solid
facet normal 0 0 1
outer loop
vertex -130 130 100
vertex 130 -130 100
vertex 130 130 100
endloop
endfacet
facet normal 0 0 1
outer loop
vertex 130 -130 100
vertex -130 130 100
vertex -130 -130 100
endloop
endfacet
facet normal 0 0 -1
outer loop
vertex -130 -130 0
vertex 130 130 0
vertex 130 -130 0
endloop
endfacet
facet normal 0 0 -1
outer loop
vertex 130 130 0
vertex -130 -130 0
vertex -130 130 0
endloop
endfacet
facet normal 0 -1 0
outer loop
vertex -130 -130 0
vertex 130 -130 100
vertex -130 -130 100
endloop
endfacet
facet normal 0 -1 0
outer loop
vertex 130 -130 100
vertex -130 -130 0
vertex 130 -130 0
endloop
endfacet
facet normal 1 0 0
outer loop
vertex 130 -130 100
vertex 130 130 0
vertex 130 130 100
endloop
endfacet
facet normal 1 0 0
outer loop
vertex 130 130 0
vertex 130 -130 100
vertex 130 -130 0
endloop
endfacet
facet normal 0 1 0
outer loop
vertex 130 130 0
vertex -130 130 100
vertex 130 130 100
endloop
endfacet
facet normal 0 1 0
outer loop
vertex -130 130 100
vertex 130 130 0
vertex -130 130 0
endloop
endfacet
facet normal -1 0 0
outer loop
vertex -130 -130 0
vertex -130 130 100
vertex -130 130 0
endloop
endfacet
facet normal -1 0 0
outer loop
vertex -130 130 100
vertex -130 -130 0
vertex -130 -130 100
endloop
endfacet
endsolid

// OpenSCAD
// Generated documentary F1 envelope proxy.
// Not manufacturing geometry, not dimensionally validated, not SimReady.
proxy_id = "993-INTERCOOLER-TA-TECHNIX-CORE-MODULE";
$fn = 96;

length_mm = 260;
width_mm = 260;
height_mm = 100;

translate([-length_mm / 2, -width_mm / 2, 0])
    cube([length_mm, width_mm, height_mm], center = false);
